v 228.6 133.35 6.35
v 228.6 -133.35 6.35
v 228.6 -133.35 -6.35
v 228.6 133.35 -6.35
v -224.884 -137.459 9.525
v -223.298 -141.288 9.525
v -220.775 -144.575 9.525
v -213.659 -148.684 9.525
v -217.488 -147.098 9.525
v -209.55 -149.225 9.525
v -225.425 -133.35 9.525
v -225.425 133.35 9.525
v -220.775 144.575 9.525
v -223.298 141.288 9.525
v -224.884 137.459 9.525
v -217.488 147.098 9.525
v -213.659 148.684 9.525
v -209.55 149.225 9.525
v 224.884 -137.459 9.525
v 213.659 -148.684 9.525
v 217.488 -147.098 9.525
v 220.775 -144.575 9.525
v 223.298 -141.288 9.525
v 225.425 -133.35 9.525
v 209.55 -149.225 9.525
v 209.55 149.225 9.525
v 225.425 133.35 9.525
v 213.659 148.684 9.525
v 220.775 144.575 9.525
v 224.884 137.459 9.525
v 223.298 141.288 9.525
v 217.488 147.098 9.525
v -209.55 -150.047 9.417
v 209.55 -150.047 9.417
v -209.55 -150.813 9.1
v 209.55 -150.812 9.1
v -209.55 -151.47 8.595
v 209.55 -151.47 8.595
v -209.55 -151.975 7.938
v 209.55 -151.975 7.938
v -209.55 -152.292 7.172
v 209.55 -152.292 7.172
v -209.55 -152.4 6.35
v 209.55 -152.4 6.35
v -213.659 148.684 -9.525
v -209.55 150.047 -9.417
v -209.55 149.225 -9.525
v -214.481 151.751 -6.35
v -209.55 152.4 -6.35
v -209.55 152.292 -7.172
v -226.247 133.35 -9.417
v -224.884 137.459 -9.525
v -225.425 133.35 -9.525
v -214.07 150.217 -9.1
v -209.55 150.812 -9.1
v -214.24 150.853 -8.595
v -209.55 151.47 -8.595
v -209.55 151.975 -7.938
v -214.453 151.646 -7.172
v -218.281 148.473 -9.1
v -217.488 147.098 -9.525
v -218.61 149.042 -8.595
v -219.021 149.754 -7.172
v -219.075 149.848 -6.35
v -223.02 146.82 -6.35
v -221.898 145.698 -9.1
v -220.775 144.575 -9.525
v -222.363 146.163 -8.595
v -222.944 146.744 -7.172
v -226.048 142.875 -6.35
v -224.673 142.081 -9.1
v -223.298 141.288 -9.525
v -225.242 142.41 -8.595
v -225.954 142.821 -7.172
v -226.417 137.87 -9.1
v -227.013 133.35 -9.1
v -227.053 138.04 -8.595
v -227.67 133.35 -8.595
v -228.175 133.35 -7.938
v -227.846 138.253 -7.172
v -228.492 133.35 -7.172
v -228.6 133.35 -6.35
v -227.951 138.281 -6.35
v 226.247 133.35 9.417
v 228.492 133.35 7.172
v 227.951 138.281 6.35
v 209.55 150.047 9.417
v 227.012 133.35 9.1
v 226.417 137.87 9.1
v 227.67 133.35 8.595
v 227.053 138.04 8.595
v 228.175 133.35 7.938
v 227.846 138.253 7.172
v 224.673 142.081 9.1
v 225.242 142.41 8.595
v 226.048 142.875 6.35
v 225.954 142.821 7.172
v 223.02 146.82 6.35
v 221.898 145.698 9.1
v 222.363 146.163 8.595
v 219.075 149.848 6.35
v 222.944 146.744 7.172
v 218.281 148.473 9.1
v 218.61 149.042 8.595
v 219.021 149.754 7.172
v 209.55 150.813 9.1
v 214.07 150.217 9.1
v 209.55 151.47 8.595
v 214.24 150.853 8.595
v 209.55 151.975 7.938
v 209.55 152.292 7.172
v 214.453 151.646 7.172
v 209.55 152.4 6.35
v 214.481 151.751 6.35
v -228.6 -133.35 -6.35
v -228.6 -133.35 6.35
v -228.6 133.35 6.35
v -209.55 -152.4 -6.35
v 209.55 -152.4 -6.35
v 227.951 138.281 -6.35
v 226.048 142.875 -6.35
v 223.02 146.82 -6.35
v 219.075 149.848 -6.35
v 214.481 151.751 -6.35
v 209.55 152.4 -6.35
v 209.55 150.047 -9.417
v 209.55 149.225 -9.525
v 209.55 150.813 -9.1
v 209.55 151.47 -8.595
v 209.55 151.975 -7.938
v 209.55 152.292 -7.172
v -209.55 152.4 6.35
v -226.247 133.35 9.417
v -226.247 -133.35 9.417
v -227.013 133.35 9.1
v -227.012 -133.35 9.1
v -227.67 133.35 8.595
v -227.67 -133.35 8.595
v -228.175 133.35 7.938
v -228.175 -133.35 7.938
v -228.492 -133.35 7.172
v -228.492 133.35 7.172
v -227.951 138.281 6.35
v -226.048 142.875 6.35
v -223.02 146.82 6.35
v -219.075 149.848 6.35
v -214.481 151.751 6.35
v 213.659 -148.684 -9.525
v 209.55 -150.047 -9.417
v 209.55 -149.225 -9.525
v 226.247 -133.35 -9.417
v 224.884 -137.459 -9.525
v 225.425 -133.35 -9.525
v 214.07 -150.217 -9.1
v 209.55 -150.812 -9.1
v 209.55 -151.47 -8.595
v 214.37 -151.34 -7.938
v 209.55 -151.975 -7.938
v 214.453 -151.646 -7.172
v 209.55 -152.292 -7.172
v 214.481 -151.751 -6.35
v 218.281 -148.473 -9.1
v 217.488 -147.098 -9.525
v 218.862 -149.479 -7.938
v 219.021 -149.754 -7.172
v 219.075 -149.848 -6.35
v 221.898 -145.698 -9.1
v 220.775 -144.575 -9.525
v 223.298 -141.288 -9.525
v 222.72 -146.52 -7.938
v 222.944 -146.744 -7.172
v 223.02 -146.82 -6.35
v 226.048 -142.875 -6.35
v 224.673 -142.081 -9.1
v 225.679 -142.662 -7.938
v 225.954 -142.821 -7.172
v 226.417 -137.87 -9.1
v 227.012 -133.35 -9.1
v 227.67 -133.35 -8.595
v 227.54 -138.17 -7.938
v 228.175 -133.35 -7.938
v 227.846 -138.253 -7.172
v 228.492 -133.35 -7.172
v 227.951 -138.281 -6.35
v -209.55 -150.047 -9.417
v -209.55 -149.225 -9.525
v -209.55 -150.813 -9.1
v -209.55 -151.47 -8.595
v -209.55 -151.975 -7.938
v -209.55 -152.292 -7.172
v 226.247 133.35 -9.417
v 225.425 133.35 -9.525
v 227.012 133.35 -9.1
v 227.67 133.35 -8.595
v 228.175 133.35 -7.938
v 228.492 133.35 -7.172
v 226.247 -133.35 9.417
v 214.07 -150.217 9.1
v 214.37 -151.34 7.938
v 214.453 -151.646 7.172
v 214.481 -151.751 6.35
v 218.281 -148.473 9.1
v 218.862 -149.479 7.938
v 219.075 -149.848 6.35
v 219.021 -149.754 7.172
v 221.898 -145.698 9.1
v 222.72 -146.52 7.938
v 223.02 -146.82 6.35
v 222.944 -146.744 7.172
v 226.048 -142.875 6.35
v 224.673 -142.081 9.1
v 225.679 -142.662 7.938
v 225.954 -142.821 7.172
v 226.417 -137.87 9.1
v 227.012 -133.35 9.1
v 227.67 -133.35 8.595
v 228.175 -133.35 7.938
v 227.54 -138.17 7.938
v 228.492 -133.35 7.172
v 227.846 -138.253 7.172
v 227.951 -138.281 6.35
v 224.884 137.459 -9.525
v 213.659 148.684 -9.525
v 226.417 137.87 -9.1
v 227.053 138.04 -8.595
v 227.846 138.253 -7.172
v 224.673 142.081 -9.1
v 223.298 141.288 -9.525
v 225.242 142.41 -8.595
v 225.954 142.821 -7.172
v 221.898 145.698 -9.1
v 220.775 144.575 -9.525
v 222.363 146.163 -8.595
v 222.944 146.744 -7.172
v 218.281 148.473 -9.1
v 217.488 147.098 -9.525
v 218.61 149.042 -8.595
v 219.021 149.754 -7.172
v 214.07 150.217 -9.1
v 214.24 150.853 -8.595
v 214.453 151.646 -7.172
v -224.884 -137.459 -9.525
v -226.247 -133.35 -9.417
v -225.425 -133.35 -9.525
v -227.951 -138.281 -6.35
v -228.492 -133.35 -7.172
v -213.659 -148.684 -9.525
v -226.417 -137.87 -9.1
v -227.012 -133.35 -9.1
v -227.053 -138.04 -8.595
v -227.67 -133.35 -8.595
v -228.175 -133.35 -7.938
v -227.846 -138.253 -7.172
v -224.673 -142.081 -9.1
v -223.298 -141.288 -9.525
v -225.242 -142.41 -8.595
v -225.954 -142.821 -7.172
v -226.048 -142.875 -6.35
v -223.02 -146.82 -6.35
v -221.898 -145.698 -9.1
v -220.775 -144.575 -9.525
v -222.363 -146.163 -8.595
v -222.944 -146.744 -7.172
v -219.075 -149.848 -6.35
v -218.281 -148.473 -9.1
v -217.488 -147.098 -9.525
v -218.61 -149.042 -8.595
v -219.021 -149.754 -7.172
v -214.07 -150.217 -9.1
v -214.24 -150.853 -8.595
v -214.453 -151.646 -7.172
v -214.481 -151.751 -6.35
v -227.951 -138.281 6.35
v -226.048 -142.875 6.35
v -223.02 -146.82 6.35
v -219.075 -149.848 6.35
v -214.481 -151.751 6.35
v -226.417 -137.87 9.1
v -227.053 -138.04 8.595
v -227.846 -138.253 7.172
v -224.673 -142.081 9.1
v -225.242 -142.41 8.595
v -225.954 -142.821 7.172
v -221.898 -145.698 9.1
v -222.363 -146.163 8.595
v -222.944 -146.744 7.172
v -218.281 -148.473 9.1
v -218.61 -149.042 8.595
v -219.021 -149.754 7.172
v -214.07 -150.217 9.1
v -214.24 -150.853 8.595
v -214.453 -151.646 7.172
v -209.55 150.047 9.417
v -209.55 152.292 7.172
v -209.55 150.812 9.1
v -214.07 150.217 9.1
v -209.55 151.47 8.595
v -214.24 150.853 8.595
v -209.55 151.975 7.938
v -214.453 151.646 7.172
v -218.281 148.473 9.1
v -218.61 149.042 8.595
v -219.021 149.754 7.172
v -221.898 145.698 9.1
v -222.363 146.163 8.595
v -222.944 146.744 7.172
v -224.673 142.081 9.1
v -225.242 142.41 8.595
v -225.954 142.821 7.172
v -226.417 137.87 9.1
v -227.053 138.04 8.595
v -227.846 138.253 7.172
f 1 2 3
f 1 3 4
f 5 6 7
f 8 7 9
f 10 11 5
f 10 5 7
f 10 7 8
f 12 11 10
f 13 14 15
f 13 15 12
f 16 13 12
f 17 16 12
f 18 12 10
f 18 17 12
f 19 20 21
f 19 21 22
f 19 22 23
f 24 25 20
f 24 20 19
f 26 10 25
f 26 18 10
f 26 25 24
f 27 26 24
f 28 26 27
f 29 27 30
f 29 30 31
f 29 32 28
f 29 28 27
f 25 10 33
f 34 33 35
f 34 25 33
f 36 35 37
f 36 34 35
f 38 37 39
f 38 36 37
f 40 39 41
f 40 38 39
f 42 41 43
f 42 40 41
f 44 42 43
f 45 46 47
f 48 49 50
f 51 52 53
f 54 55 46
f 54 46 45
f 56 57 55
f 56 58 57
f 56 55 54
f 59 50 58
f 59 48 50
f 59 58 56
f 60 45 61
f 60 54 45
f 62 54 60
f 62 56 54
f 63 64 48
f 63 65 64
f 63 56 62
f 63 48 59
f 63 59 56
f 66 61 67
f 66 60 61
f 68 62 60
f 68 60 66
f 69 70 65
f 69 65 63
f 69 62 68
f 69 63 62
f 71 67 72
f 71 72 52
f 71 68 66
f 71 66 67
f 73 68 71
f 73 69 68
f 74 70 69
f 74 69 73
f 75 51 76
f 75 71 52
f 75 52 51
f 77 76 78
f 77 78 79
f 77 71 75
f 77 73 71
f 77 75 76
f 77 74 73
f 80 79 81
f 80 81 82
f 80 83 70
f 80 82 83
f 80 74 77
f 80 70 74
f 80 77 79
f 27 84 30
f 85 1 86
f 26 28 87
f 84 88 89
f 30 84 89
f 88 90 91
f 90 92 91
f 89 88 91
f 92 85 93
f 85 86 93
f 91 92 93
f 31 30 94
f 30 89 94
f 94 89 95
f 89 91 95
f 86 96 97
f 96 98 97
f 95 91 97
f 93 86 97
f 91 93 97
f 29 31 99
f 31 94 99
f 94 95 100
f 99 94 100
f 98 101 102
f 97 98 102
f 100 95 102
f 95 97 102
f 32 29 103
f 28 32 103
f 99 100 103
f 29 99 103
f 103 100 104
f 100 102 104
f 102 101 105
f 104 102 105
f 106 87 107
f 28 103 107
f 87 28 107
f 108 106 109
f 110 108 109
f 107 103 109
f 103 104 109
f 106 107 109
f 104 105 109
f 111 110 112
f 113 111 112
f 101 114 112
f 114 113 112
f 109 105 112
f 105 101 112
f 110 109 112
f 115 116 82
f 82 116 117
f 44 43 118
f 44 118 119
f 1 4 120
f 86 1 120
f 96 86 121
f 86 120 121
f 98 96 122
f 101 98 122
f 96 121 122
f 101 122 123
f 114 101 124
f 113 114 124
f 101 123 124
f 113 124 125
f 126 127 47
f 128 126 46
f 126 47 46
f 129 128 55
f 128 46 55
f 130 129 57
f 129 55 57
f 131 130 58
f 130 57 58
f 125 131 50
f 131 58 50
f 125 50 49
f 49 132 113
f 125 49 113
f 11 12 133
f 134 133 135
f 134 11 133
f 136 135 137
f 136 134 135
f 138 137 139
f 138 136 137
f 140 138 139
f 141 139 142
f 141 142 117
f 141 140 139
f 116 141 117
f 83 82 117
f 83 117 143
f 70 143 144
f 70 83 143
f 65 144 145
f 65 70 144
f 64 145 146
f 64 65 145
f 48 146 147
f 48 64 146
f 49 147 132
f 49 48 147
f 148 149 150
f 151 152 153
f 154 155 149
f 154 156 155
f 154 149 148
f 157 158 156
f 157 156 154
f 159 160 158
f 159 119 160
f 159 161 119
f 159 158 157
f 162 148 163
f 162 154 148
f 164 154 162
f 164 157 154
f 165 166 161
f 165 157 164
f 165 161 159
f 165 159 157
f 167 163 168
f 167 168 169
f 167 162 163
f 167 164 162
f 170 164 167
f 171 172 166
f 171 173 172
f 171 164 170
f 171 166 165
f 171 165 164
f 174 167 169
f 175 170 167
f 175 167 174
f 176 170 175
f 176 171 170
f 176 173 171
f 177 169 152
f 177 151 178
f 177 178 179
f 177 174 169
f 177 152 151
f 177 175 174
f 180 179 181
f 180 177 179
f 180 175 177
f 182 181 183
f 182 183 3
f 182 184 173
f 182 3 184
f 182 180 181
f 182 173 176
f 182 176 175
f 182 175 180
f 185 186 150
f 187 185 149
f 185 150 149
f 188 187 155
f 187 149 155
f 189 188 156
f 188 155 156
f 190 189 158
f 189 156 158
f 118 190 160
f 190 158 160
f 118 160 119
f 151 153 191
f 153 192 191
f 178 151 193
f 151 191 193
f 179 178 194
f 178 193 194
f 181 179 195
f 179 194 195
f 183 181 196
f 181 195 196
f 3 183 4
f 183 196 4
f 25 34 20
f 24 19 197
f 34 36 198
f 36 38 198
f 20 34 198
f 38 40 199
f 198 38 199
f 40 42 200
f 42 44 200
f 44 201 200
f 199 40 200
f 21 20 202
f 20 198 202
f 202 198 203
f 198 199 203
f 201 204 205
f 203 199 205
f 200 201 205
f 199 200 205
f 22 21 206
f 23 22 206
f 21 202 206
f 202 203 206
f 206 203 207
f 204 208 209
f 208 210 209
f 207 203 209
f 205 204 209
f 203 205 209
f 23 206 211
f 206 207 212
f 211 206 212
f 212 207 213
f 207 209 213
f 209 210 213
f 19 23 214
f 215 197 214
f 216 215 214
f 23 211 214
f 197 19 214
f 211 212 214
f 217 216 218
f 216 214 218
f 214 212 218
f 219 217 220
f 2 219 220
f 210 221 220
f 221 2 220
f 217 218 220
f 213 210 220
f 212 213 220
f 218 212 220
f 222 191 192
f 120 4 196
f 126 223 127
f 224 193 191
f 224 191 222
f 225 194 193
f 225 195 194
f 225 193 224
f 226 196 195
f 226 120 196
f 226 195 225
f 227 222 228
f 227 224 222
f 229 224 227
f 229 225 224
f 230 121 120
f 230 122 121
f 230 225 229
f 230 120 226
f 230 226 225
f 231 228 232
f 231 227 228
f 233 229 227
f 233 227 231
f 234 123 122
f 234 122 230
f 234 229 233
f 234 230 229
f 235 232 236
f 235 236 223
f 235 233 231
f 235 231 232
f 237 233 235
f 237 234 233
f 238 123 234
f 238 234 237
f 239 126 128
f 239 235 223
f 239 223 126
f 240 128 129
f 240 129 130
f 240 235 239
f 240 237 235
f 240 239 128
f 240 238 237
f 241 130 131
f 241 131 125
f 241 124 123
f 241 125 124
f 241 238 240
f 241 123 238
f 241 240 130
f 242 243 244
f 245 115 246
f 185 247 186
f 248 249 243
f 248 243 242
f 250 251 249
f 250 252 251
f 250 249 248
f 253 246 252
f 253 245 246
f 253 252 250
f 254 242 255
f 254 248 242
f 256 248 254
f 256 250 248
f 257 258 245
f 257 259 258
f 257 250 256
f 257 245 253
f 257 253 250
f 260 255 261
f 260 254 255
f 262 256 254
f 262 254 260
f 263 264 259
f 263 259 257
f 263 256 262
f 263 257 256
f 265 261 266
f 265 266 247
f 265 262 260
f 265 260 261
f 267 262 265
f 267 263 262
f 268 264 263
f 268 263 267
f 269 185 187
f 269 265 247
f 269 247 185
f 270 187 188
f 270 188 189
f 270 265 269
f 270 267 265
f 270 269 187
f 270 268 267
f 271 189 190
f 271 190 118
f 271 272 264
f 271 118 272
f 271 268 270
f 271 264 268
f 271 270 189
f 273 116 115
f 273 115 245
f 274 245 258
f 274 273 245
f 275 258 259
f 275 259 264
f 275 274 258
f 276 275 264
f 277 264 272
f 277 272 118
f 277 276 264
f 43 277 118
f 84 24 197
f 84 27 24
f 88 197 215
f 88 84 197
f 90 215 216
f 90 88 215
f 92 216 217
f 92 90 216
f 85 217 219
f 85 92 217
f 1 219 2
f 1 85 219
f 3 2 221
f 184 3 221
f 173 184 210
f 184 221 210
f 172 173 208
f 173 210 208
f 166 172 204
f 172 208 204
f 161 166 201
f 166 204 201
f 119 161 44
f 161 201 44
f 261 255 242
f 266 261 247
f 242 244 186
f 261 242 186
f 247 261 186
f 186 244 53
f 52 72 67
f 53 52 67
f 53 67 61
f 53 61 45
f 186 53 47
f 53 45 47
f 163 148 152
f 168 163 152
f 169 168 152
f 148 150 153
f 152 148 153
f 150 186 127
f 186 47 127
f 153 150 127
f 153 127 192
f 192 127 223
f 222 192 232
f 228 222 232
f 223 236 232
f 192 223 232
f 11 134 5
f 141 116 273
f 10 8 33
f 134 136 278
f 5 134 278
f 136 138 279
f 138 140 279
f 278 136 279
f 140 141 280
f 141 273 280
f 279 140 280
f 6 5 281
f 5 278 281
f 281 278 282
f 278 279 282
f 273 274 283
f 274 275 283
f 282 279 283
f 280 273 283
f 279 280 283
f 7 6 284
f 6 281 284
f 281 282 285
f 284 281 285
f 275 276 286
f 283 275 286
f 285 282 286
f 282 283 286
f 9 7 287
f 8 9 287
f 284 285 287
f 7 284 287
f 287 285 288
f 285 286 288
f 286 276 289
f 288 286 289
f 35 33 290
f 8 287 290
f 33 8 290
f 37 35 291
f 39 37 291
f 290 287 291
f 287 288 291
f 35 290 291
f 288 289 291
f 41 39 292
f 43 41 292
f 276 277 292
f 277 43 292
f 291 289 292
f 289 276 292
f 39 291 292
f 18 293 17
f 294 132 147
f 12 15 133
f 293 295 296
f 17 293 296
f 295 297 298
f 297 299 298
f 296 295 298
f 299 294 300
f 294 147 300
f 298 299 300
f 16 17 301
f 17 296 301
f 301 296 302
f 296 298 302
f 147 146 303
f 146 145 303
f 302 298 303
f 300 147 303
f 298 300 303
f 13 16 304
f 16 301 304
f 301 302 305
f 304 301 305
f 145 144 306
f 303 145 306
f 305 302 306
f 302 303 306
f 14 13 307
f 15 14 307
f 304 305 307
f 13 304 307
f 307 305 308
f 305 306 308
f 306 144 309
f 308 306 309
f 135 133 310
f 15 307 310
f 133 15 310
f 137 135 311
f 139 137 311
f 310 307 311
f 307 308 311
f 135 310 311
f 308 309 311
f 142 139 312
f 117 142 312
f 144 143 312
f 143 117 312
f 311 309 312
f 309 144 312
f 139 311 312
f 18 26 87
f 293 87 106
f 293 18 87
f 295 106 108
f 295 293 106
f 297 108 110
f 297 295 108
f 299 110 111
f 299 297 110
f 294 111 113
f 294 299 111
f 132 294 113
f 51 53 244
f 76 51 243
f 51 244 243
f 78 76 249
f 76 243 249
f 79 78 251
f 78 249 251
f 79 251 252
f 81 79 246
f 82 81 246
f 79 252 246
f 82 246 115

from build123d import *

# Parameters (mm, degrees)
F0_W     = 457.2
F0_H     = 304.8
F1_DEPTH = 9.525
F2_R     = 19.05
F3_R     = 3.175


with BuildPart() as f1:
    # F0 (on Top) → F1 (new body, symmetric)
    with BuildSketch(Plane.XY):
        Rectangle(F0_W, F0_H)
    extrude(amount=F1_DEPTH, both=True)

    # F2
    f2_edges = [f1.edges().sort_by_distance(p)[0] for p in [
        (-228.6, -152.4, 0),
        (228.6, -152.4, 0),
        (228.6, 152.4, 0),
        (-228.6, 152.4, 0),
    ]]
    fillet(f2_edges, radius=F2_R)

    # F3
    f3_edges = [f1.edges().sort_by_distance(p)[0] for p in [
        (228.6, 0, 9.525),
        (223.020384, -146.820384, 9.525),
        (223.020384, 146.820384, 9.525),
        (0, -152.4, 9.525),
        (0, 152.4, 9.525),
        (-223.020384, -146.820384, 9.525),
        (-223.020384, 146.820384, 9.525),
        (-228.6, 0, 9.525),
        (228.6, 0, -9.525),
        (223.020384, -146.820384, -9.525),
        (223.020384, 146.820384, -9.525),
        (0, -152.4, -9.525),
        (0, 152.4, -9.525),
        (-223.020384, -146.820384, -9.525),
        (-223.020384, 146.820384, -9.525),
        (-228.6, 0, -9.525),
    ]]
    fillet(f3_edges, radius=F3_R)


solid = f1.part
